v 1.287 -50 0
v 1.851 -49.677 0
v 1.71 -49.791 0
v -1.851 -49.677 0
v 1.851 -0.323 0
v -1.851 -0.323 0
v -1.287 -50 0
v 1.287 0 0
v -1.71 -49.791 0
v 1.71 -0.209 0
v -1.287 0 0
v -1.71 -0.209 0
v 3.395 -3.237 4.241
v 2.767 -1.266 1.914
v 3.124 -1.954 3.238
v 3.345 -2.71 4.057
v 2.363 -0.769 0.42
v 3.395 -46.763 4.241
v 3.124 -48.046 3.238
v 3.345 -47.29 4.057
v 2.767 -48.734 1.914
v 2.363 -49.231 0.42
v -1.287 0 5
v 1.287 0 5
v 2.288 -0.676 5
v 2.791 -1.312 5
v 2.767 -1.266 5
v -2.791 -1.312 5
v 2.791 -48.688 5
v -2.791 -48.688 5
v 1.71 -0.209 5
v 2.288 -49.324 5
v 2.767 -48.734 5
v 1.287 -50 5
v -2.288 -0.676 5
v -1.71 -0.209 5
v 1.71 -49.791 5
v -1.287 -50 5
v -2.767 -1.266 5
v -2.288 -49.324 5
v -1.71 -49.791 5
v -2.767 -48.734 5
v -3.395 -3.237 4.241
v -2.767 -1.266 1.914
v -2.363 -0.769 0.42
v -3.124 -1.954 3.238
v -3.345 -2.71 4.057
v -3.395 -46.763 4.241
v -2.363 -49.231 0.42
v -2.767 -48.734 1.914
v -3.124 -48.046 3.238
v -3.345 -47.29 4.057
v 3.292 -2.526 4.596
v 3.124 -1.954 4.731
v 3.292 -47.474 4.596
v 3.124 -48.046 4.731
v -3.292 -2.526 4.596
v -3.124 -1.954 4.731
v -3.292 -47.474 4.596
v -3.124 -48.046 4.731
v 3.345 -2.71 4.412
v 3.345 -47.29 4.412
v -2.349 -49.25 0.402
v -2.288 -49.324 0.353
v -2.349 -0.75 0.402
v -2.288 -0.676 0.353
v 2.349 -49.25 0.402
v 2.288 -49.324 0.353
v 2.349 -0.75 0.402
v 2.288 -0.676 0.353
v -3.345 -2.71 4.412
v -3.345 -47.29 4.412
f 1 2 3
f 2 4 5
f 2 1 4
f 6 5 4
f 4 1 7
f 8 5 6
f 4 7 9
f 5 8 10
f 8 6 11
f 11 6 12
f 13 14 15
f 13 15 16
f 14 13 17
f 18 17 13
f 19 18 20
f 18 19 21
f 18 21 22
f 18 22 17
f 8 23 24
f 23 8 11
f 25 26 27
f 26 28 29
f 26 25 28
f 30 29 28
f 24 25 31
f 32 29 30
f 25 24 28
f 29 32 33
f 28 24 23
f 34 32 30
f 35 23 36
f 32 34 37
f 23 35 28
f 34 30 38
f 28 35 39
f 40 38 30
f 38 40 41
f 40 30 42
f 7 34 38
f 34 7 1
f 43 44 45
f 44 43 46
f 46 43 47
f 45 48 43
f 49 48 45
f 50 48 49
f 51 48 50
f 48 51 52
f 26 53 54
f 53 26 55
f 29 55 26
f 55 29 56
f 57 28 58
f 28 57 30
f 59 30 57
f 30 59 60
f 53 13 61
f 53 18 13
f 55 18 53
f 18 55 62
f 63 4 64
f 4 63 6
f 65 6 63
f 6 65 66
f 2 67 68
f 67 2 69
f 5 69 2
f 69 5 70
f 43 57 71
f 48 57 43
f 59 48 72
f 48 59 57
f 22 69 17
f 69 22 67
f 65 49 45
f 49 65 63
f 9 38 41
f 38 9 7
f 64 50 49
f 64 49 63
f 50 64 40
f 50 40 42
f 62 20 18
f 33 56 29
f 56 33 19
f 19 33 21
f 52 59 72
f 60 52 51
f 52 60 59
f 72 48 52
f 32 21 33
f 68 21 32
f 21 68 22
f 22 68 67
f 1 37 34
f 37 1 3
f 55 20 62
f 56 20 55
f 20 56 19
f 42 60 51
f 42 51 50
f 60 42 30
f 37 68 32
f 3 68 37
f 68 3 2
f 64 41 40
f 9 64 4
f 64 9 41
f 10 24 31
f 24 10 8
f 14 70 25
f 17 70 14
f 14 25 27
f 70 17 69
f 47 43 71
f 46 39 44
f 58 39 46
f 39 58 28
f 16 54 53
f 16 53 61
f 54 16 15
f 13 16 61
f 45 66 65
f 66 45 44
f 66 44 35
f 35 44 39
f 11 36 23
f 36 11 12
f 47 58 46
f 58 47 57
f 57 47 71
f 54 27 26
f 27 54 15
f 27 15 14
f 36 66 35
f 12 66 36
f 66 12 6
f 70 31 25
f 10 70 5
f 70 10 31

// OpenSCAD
// file: globals.scad
/*
Most things in this file is represented as one millimeter, so keep that in mind while changing things.
Some of the setting are not mm but at variables that you can set, such as 2*x=2x and you are setting what x is.
I will try to specify when things are variables and not exact measurements.
*/

obj_leg = 30;
leg_length = 5.5;
small_number = 0.001;
metal_core_rode_global = 5;


///////////////// number of holes /////////////////////
z_hole_number = 8;
other_holes = 8;

///////////////// Pins /////////////////////

//pins that poke out
ball_size = 10;
pin_height = 20;
pin_diameter = 6;


//holes
hole_ball_size = ball_size;
hole_pin_height = pin_height;
hole_pin_diameter = pin_diameter;

///////////////// Z THINGS /////////////////////

berring_slot_width = 7.5;
berring_slot_depth = 6.5;
metal_core_rode = 5;

///////////////// X THINGS /////////////////////

//male dove tails
max_width=8;
min_width=5;
depth=5;
height=obj_leg/2;

//female dove tails, this is found on the y mounts
girl_max_width=11;
girl_min_width=5;
girl_depth=5;
girl_height=obj_leg;


///////////////// Y THINGS /////////////////////
/*
The Y is so normal that all of those global variables at the top should change all of the setting in it, this section is set her incase there are variables set in the future development of this project.
*/
// file: include.scad
//////////////////      END SECTION       //////////////////

	module added_pins(){
		difference(){
			union(){
				translate([30/(15/4),obj_leg*leg_length,30/(15/4)]) pin();
				translate([30/(15/4)+14.5,obj_leg*leg_length,30/(15/4)+14]) pin();
			}
			union(){
							translate([30/(15/4)+13.5,obj_leg*leg_length-20,30/(15/4)+5])cube(size=[2,40,15]);
							translate([30/(15/4)+7.5,obj_leg*leg_length-20,30/(15/4)+15])rotate([0,90,0]) cube(size=[2,40,15]);	

							translate([30/(15/4)-1,obj_leg*leg_length-20,30/(15/4)-8])cube(size=[2,40,15]);
							translate([30/(15/4)-10,obj_leg*leg_length-20,30/(15/4)+1])rotate([0,90,0]) cube(size=[2,40,15]);
			}
		}
	}
	module taken_pins() {
		translate([30/(15/4)+14,obj_leg*leg_length-10,30/(15/4)]) mirror_pin();
		translate([30/(15/4),obj_leg*leg_length-10,30/(15/4)+15]) mirror_pin();
	}


//////////////////      OTHER STUFF       //////////////////

	module holes() {
		rotate([0,0,90]) for(y=[0:other_holes])
		translate([obj_leg+y*15,-15.5,7.5]) union() {
			translate([7.5,0,15]) hole_up();
			hole_down();
		}
	}
	module extend_holes() {
	module top(){
		rotate([0,0,90]) for(y=[0:other_holes+1])
		translate([(30/4)+y*15,-15.5,7.5]) union() {
			translate([7.5,0,15]) hole_up();
		}
	}
	module bottom(){
		rotate([0,0,90]) for(y=[0:other_holes+2])
		translate([(30/4)+y*15,-15.5,7.5]) union() {
			hole_down();
		
}
	}
	union(){
		top();
		bottom();
	}
	}

	module hole() {
		union() {
			rotate([90, 90, 0]) cylinder(h=40, d=hole_pin_diameter, center=true);
			translate([0,7.5,0]) sphere(d=hole_ball_size);
			translate([0,-6,0]) sphere(d=hole_ball_size);
		}
	}
	module hole_up() {
		union() {
			rotate([90, 90, 0]) cylinder(h=40, d=hole_pin_diameter, center=true);
			translate([0,7.5,10]) cylinder(h=hole_pin_height, d=hole_pin_diameter, center=true);
			translate([0,-6,10]) cylinder(h=hole_pin_height, d=hole_pin_diameter, center=true);
			translate([0,7.5,0]) sphere(d=hole_ball_size);
			translate([0,-6,0]) sphere(d=hole_ball_size);
		}
	}
	module hole_down() {
		union() {
			rotate([90, 90, 0]) cylinder(h=40, d=hole_pin_diameter, center=true);
			translate([0,7.5,-10]) cylinder(h=hole_pin_height, d=hole_pin_diameter, center=true);
			translate([0,-6,-10]) cylinder(h=hole_pin_height, d=hole_pin_diameter, center=true);
			translate([0,7.5,0]) sphere(d=hole_ball_size);
			translate([0,-6,0]) sphere(d=hole_ball_size);
		}
	}
	module pin() {
		union() {
			rotate([90, 90, 0]) cylinder(h=pin_height, d=pin_diameter, center=true);
			translate([0,7.5,0]) sphere(d=ball_size);
		}
	}

	module mirror_pin() {
		rotate([90, 90, 0]) cylinder(h=hole_pin_height+small_number, d=hole_pin_diameter, center=true);
		translate([0,-(pin_height-(ball_size/2)),0]) sphere(d=ball_size);
	}


//////////////////      SOME RACK AND Z THINGS       //////////////////

module z_holes() {
    rotate([0,-90,0]) for(z=[0:z_hole_number])
    translate([22.5+z*15,16,-12])
        hole();
}

module pin_cuts() {
	union(){
		cube(size=[2,10,40], center=true);
		rotate([0,0,90]) cube(size=[2,10,40], center=true);
	}
}
module pin_uncut() {
	union(){
		rotate([0, 0, 90]) cylinder(h=hole_pin_height, d=hole_pin_diameter, center=true);
		translate([0,0,10]) sphere(d=ball_hole);
	}
}


module pin_out() {
	union(){
		rotate([0, 0, 90]) cylinder(h=pin_height, d=pin_diameter, center=true);
		translate([0,0,10]) sphere(d= ball_size);
	}
}


module pins_z(){
	difference() {
		pin_out();
		pin_cuts();
	}
}
//////////////////      RACK AND SLIDE     ///////////////////

module straight_pins() {
	for(z=[0:((((obj_leg*leg_length)*2)-(obj_leg*2))/3)/14.5]) rotate([-90,0,0]) translate([z*15,30/(15/4),14]) pins_z();
	for(z=[0:((((obj_leg*leg_length)*2)-(obj_leg*2))/3)/14.5]) rotate([-90,0,0]) translate([z*15,30/(15/4)-14,14]) pins_z();
}
module stagger_pins() {
	for(z=[0:((((obj_leg*leg_length)*2)-(obj_leg*2))/3)/14.5]) rotate([-90,0,0]) translate([z*15,30/(15/4),14]) pins_z();
	for(z=[0:((((obj_leg*leg_length)*2)-(obj_leg*2))/3)/14.5]) rotate([-90,0,0]) translate([z*15+7,30/(15/4)-14,14]) pins_z();
}


//////////////////      DOVE TAIL       //////////////////

module male_dovetail(height) {
	dovetail_3d(max_width,min_width,depth,height);
}

module dovetail_3d(max_width=11, min_width=5, depth=5, height=30) {
	linear_extrude(height=height, convexity=2)
		dovetail_2d(max_width,min_width,depth);
}

module dovetail_2d(max_width=11, min_width=5, depth=5) {
	angle=atan((max_width/2-min_width/2)/depth);
	echo("angle: ", angle);
	polygon(paths=[[0,1,2,3,0]], points=[[-min_width/2,0], [-max_width/2,depth], [max_width/2, depth], [min_width/2,0]]);
}

//bow tie
	module tie_end(height){
				rotate([0,0,0]) translate([0,-0.01,((obj_leg/2)/2)]) male_dovetail(height);
				rotate([0,90,0]) translate([0,-0.01,((obj_leg/2)/2)]) male_dovetail(height);
				rotate([0,180,0]) translate([0,-0.01,((obj_leg/2)/2)]) male_dovetail(height);
				rotate([0,-90,0]) translate([0,-0.01,((obj_leg/2)/2)]) male_dovetail(height);
	}

module bow_support(){
	difference(){
		intersection(){
			translate([-15,0,-15]) cube([30,9,30]);
			scale([1.05,1.05,1.05]) rotate([0,45,0]) tie_end();
		}
		cube([29.2,29.2,29.2], center=true);
	}
}

	module wrap(units){
	for (y = [-1:units-2]) // two iterations, z = -1, z = 1
	{
			translate([15, (y*30)+15, 15]){
			for (r = [0:4]) // two iterations, z = -1, z = 1
			{
				rotate([0,r*90,0]) translate([0,15,15]) rotate([-90,0,0])male_dovetail(height=30);
			}
		}
	}
	}
// main file
length = 50;
tilt_level = 1.1;
scaling_x = .9;
scaling_y = 1;
scaling_z = 1;
include <include.scad>;
include <globals.scad>;

$fn=30;
module end(){
    difference() {
        translate([-4, -5, -0.2]) cube([8, 5, 6]);
        translate([0, 0, -0.5])cylinder(r=3.8, h=7);
    }
}

module tie() {
    intersection() {
        intersection() {
            rotate([90,0,0]) male_dovetail(height=length);
            rotate([90,0,0]) cylinder(r=5.9, h=200);
        }
        translate([0,0,3.3]) rotate([90,0,0]) cylinder(r=3.9, h=100);
    }
}
scale([scaling_x,scaling_y,scaling_z]) difference () {
    tie();
    translate([0, -(length -3.5), 0]) end();
    translate([0, -3.5, 0]) rotate([0,0,180]) end();
}
